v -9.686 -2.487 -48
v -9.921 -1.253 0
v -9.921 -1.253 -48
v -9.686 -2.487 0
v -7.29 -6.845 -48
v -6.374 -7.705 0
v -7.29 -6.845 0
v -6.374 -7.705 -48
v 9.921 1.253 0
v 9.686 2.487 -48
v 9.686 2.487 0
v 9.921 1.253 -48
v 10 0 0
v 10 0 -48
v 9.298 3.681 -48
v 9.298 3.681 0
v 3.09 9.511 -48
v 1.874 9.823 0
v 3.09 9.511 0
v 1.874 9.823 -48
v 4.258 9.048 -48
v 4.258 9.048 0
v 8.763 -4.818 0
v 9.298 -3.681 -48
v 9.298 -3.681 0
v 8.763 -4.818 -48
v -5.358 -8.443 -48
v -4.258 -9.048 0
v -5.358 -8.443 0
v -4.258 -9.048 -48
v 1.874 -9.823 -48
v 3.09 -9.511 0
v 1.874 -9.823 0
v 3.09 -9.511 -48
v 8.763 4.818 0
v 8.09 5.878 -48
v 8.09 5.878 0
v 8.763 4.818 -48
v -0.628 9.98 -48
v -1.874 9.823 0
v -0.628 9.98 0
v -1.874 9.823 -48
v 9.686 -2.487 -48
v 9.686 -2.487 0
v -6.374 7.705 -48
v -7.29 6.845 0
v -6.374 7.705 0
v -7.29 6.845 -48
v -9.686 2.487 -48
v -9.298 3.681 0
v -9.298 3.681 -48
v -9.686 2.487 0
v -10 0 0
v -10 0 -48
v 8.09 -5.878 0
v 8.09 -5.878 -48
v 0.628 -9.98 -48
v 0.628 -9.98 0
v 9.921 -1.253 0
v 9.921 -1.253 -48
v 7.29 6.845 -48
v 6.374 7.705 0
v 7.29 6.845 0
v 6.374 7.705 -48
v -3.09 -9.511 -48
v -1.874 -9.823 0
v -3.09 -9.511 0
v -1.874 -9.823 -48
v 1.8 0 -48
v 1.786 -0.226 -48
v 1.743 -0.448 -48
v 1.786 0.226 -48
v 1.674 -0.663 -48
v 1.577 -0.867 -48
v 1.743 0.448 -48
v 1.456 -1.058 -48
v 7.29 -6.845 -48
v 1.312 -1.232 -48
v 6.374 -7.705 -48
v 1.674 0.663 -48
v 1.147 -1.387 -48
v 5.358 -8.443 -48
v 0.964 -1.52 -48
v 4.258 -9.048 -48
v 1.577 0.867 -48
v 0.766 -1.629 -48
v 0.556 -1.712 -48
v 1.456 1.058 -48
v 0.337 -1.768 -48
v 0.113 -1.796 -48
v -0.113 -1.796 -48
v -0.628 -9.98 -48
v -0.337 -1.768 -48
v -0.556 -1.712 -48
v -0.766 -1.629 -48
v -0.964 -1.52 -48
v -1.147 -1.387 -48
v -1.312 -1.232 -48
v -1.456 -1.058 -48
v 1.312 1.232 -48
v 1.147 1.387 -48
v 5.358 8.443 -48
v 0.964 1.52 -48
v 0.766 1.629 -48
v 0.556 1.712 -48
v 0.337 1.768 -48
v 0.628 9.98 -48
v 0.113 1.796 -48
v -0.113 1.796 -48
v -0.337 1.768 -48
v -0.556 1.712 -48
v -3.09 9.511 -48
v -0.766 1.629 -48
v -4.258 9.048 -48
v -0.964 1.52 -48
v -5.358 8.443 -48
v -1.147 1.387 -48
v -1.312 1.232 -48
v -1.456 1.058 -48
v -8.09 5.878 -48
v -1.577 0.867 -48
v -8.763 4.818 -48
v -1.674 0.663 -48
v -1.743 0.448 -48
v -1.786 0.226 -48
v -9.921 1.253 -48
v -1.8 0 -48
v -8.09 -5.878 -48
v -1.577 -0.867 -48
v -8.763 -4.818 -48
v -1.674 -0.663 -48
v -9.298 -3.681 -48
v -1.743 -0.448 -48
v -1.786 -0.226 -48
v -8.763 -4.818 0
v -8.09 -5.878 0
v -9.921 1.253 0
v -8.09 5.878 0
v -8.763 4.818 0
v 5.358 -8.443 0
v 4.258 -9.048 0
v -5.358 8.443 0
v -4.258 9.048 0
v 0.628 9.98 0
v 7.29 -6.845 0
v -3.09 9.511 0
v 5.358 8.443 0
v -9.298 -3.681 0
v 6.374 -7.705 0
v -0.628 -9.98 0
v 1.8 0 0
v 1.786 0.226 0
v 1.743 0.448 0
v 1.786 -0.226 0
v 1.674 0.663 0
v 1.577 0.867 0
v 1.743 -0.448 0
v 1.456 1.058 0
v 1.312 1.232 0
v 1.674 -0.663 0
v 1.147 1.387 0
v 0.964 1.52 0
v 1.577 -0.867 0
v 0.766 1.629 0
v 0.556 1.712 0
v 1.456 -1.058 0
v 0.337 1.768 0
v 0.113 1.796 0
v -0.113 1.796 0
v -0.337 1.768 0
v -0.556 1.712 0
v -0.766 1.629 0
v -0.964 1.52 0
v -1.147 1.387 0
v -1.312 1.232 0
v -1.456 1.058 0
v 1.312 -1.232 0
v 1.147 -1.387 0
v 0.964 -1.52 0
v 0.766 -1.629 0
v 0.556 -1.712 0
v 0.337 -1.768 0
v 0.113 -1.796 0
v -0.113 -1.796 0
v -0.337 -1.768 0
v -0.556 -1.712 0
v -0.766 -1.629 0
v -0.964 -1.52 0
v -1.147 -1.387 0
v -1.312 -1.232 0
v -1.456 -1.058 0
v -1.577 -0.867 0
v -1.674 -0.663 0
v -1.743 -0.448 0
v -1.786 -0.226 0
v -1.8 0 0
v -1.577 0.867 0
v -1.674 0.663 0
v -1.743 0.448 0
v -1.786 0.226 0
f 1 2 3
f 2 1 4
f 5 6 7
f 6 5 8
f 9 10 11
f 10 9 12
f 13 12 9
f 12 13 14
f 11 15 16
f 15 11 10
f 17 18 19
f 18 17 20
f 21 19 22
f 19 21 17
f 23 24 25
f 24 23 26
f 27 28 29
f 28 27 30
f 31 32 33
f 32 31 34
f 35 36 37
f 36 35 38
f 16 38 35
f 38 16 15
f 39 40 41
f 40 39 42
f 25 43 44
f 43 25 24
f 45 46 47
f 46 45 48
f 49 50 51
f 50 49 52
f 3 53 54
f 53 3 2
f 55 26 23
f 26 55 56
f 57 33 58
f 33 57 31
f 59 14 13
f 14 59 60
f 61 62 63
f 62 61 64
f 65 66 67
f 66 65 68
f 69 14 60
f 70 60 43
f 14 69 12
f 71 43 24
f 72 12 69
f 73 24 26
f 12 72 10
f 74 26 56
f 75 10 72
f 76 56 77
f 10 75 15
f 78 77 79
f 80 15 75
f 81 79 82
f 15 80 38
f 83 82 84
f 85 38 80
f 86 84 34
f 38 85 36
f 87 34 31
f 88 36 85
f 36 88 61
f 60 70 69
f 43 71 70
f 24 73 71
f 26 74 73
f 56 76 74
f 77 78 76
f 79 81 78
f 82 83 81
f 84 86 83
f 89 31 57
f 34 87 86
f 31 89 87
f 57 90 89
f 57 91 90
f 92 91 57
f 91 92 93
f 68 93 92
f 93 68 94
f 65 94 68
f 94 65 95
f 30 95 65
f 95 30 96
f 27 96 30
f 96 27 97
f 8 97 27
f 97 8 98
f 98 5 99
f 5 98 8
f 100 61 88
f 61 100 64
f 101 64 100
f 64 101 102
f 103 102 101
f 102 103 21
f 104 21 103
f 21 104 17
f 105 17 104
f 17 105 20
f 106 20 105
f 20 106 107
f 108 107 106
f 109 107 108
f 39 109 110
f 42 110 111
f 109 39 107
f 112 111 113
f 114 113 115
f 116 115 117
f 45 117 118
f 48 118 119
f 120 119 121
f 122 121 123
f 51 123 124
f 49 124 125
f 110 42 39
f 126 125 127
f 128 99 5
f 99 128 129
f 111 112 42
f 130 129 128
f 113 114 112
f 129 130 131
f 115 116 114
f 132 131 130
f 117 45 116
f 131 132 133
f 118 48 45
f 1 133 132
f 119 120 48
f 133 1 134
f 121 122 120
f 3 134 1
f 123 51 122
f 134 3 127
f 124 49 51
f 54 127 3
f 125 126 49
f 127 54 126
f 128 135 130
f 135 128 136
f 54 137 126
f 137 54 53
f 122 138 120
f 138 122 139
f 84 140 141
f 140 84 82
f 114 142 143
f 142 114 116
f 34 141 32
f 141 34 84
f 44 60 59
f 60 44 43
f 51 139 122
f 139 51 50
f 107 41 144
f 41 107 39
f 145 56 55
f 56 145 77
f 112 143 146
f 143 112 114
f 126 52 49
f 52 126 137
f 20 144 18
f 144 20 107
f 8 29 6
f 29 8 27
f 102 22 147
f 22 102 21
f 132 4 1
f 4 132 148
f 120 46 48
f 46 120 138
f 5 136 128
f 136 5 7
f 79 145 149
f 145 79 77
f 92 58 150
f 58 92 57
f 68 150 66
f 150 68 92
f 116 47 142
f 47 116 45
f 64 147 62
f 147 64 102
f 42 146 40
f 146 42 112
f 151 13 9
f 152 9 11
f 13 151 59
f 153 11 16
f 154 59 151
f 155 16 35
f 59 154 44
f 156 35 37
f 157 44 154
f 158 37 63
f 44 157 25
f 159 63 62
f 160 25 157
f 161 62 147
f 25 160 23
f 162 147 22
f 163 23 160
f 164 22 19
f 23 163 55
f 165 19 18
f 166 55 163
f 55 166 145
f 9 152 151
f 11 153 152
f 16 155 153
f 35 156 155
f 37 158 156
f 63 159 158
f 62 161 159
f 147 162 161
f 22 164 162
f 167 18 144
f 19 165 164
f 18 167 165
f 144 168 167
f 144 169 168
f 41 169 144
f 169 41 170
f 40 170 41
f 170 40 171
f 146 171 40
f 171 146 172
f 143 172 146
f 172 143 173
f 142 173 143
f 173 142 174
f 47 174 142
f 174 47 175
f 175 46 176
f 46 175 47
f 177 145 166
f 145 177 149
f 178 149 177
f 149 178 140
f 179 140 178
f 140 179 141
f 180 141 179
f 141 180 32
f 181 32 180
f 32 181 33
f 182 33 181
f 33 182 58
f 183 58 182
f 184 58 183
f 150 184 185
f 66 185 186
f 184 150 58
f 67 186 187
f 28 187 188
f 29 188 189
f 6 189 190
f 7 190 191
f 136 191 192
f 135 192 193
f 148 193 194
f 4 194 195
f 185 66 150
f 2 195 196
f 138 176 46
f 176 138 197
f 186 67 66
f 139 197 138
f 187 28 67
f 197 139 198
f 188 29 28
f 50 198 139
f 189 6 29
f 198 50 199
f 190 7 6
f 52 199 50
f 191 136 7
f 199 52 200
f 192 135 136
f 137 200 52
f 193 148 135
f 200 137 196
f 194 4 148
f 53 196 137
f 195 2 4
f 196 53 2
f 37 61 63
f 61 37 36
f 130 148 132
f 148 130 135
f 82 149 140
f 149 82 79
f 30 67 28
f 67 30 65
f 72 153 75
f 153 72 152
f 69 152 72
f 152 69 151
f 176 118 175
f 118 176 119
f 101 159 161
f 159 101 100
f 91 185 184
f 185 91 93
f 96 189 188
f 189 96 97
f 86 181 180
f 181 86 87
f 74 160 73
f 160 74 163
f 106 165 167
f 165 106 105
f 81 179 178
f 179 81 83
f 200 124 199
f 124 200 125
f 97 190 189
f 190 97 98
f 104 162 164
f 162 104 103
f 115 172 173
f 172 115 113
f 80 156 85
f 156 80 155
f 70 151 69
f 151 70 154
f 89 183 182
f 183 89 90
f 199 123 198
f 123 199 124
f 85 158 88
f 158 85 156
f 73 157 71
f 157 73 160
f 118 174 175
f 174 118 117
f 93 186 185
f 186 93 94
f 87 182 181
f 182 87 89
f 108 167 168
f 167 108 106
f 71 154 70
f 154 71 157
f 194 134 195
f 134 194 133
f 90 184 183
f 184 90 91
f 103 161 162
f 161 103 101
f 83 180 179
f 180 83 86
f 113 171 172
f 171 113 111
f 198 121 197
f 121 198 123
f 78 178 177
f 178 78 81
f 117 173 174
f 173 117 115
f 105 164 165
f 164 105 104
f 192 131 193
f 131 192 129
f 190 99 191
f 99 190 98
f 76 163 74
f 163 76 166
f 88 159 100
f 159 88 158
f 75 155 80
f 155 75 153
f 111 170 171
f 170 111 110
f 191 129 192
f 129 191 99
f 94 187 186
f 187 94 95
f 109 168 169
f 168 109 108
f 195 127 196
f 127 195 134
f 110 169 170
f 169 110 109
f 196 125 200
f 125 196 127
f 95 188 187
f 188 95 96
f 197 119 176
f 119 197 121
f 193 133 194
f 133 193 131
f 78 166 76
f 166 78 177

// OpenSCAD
$fn = 50;


difference() {
	union() {
		translate(v = [0, 0, -48.0000000000]) {
			cylinder(h = 48, r = 10.0000000000);
		}
		cylinder(h = 0, r = 16.0000000000);
	}
	union() {
		#translate(v = [0, 0, -48]) {
			cylinder(h = 48, r = 1.8000000000);
		}
	}
}
